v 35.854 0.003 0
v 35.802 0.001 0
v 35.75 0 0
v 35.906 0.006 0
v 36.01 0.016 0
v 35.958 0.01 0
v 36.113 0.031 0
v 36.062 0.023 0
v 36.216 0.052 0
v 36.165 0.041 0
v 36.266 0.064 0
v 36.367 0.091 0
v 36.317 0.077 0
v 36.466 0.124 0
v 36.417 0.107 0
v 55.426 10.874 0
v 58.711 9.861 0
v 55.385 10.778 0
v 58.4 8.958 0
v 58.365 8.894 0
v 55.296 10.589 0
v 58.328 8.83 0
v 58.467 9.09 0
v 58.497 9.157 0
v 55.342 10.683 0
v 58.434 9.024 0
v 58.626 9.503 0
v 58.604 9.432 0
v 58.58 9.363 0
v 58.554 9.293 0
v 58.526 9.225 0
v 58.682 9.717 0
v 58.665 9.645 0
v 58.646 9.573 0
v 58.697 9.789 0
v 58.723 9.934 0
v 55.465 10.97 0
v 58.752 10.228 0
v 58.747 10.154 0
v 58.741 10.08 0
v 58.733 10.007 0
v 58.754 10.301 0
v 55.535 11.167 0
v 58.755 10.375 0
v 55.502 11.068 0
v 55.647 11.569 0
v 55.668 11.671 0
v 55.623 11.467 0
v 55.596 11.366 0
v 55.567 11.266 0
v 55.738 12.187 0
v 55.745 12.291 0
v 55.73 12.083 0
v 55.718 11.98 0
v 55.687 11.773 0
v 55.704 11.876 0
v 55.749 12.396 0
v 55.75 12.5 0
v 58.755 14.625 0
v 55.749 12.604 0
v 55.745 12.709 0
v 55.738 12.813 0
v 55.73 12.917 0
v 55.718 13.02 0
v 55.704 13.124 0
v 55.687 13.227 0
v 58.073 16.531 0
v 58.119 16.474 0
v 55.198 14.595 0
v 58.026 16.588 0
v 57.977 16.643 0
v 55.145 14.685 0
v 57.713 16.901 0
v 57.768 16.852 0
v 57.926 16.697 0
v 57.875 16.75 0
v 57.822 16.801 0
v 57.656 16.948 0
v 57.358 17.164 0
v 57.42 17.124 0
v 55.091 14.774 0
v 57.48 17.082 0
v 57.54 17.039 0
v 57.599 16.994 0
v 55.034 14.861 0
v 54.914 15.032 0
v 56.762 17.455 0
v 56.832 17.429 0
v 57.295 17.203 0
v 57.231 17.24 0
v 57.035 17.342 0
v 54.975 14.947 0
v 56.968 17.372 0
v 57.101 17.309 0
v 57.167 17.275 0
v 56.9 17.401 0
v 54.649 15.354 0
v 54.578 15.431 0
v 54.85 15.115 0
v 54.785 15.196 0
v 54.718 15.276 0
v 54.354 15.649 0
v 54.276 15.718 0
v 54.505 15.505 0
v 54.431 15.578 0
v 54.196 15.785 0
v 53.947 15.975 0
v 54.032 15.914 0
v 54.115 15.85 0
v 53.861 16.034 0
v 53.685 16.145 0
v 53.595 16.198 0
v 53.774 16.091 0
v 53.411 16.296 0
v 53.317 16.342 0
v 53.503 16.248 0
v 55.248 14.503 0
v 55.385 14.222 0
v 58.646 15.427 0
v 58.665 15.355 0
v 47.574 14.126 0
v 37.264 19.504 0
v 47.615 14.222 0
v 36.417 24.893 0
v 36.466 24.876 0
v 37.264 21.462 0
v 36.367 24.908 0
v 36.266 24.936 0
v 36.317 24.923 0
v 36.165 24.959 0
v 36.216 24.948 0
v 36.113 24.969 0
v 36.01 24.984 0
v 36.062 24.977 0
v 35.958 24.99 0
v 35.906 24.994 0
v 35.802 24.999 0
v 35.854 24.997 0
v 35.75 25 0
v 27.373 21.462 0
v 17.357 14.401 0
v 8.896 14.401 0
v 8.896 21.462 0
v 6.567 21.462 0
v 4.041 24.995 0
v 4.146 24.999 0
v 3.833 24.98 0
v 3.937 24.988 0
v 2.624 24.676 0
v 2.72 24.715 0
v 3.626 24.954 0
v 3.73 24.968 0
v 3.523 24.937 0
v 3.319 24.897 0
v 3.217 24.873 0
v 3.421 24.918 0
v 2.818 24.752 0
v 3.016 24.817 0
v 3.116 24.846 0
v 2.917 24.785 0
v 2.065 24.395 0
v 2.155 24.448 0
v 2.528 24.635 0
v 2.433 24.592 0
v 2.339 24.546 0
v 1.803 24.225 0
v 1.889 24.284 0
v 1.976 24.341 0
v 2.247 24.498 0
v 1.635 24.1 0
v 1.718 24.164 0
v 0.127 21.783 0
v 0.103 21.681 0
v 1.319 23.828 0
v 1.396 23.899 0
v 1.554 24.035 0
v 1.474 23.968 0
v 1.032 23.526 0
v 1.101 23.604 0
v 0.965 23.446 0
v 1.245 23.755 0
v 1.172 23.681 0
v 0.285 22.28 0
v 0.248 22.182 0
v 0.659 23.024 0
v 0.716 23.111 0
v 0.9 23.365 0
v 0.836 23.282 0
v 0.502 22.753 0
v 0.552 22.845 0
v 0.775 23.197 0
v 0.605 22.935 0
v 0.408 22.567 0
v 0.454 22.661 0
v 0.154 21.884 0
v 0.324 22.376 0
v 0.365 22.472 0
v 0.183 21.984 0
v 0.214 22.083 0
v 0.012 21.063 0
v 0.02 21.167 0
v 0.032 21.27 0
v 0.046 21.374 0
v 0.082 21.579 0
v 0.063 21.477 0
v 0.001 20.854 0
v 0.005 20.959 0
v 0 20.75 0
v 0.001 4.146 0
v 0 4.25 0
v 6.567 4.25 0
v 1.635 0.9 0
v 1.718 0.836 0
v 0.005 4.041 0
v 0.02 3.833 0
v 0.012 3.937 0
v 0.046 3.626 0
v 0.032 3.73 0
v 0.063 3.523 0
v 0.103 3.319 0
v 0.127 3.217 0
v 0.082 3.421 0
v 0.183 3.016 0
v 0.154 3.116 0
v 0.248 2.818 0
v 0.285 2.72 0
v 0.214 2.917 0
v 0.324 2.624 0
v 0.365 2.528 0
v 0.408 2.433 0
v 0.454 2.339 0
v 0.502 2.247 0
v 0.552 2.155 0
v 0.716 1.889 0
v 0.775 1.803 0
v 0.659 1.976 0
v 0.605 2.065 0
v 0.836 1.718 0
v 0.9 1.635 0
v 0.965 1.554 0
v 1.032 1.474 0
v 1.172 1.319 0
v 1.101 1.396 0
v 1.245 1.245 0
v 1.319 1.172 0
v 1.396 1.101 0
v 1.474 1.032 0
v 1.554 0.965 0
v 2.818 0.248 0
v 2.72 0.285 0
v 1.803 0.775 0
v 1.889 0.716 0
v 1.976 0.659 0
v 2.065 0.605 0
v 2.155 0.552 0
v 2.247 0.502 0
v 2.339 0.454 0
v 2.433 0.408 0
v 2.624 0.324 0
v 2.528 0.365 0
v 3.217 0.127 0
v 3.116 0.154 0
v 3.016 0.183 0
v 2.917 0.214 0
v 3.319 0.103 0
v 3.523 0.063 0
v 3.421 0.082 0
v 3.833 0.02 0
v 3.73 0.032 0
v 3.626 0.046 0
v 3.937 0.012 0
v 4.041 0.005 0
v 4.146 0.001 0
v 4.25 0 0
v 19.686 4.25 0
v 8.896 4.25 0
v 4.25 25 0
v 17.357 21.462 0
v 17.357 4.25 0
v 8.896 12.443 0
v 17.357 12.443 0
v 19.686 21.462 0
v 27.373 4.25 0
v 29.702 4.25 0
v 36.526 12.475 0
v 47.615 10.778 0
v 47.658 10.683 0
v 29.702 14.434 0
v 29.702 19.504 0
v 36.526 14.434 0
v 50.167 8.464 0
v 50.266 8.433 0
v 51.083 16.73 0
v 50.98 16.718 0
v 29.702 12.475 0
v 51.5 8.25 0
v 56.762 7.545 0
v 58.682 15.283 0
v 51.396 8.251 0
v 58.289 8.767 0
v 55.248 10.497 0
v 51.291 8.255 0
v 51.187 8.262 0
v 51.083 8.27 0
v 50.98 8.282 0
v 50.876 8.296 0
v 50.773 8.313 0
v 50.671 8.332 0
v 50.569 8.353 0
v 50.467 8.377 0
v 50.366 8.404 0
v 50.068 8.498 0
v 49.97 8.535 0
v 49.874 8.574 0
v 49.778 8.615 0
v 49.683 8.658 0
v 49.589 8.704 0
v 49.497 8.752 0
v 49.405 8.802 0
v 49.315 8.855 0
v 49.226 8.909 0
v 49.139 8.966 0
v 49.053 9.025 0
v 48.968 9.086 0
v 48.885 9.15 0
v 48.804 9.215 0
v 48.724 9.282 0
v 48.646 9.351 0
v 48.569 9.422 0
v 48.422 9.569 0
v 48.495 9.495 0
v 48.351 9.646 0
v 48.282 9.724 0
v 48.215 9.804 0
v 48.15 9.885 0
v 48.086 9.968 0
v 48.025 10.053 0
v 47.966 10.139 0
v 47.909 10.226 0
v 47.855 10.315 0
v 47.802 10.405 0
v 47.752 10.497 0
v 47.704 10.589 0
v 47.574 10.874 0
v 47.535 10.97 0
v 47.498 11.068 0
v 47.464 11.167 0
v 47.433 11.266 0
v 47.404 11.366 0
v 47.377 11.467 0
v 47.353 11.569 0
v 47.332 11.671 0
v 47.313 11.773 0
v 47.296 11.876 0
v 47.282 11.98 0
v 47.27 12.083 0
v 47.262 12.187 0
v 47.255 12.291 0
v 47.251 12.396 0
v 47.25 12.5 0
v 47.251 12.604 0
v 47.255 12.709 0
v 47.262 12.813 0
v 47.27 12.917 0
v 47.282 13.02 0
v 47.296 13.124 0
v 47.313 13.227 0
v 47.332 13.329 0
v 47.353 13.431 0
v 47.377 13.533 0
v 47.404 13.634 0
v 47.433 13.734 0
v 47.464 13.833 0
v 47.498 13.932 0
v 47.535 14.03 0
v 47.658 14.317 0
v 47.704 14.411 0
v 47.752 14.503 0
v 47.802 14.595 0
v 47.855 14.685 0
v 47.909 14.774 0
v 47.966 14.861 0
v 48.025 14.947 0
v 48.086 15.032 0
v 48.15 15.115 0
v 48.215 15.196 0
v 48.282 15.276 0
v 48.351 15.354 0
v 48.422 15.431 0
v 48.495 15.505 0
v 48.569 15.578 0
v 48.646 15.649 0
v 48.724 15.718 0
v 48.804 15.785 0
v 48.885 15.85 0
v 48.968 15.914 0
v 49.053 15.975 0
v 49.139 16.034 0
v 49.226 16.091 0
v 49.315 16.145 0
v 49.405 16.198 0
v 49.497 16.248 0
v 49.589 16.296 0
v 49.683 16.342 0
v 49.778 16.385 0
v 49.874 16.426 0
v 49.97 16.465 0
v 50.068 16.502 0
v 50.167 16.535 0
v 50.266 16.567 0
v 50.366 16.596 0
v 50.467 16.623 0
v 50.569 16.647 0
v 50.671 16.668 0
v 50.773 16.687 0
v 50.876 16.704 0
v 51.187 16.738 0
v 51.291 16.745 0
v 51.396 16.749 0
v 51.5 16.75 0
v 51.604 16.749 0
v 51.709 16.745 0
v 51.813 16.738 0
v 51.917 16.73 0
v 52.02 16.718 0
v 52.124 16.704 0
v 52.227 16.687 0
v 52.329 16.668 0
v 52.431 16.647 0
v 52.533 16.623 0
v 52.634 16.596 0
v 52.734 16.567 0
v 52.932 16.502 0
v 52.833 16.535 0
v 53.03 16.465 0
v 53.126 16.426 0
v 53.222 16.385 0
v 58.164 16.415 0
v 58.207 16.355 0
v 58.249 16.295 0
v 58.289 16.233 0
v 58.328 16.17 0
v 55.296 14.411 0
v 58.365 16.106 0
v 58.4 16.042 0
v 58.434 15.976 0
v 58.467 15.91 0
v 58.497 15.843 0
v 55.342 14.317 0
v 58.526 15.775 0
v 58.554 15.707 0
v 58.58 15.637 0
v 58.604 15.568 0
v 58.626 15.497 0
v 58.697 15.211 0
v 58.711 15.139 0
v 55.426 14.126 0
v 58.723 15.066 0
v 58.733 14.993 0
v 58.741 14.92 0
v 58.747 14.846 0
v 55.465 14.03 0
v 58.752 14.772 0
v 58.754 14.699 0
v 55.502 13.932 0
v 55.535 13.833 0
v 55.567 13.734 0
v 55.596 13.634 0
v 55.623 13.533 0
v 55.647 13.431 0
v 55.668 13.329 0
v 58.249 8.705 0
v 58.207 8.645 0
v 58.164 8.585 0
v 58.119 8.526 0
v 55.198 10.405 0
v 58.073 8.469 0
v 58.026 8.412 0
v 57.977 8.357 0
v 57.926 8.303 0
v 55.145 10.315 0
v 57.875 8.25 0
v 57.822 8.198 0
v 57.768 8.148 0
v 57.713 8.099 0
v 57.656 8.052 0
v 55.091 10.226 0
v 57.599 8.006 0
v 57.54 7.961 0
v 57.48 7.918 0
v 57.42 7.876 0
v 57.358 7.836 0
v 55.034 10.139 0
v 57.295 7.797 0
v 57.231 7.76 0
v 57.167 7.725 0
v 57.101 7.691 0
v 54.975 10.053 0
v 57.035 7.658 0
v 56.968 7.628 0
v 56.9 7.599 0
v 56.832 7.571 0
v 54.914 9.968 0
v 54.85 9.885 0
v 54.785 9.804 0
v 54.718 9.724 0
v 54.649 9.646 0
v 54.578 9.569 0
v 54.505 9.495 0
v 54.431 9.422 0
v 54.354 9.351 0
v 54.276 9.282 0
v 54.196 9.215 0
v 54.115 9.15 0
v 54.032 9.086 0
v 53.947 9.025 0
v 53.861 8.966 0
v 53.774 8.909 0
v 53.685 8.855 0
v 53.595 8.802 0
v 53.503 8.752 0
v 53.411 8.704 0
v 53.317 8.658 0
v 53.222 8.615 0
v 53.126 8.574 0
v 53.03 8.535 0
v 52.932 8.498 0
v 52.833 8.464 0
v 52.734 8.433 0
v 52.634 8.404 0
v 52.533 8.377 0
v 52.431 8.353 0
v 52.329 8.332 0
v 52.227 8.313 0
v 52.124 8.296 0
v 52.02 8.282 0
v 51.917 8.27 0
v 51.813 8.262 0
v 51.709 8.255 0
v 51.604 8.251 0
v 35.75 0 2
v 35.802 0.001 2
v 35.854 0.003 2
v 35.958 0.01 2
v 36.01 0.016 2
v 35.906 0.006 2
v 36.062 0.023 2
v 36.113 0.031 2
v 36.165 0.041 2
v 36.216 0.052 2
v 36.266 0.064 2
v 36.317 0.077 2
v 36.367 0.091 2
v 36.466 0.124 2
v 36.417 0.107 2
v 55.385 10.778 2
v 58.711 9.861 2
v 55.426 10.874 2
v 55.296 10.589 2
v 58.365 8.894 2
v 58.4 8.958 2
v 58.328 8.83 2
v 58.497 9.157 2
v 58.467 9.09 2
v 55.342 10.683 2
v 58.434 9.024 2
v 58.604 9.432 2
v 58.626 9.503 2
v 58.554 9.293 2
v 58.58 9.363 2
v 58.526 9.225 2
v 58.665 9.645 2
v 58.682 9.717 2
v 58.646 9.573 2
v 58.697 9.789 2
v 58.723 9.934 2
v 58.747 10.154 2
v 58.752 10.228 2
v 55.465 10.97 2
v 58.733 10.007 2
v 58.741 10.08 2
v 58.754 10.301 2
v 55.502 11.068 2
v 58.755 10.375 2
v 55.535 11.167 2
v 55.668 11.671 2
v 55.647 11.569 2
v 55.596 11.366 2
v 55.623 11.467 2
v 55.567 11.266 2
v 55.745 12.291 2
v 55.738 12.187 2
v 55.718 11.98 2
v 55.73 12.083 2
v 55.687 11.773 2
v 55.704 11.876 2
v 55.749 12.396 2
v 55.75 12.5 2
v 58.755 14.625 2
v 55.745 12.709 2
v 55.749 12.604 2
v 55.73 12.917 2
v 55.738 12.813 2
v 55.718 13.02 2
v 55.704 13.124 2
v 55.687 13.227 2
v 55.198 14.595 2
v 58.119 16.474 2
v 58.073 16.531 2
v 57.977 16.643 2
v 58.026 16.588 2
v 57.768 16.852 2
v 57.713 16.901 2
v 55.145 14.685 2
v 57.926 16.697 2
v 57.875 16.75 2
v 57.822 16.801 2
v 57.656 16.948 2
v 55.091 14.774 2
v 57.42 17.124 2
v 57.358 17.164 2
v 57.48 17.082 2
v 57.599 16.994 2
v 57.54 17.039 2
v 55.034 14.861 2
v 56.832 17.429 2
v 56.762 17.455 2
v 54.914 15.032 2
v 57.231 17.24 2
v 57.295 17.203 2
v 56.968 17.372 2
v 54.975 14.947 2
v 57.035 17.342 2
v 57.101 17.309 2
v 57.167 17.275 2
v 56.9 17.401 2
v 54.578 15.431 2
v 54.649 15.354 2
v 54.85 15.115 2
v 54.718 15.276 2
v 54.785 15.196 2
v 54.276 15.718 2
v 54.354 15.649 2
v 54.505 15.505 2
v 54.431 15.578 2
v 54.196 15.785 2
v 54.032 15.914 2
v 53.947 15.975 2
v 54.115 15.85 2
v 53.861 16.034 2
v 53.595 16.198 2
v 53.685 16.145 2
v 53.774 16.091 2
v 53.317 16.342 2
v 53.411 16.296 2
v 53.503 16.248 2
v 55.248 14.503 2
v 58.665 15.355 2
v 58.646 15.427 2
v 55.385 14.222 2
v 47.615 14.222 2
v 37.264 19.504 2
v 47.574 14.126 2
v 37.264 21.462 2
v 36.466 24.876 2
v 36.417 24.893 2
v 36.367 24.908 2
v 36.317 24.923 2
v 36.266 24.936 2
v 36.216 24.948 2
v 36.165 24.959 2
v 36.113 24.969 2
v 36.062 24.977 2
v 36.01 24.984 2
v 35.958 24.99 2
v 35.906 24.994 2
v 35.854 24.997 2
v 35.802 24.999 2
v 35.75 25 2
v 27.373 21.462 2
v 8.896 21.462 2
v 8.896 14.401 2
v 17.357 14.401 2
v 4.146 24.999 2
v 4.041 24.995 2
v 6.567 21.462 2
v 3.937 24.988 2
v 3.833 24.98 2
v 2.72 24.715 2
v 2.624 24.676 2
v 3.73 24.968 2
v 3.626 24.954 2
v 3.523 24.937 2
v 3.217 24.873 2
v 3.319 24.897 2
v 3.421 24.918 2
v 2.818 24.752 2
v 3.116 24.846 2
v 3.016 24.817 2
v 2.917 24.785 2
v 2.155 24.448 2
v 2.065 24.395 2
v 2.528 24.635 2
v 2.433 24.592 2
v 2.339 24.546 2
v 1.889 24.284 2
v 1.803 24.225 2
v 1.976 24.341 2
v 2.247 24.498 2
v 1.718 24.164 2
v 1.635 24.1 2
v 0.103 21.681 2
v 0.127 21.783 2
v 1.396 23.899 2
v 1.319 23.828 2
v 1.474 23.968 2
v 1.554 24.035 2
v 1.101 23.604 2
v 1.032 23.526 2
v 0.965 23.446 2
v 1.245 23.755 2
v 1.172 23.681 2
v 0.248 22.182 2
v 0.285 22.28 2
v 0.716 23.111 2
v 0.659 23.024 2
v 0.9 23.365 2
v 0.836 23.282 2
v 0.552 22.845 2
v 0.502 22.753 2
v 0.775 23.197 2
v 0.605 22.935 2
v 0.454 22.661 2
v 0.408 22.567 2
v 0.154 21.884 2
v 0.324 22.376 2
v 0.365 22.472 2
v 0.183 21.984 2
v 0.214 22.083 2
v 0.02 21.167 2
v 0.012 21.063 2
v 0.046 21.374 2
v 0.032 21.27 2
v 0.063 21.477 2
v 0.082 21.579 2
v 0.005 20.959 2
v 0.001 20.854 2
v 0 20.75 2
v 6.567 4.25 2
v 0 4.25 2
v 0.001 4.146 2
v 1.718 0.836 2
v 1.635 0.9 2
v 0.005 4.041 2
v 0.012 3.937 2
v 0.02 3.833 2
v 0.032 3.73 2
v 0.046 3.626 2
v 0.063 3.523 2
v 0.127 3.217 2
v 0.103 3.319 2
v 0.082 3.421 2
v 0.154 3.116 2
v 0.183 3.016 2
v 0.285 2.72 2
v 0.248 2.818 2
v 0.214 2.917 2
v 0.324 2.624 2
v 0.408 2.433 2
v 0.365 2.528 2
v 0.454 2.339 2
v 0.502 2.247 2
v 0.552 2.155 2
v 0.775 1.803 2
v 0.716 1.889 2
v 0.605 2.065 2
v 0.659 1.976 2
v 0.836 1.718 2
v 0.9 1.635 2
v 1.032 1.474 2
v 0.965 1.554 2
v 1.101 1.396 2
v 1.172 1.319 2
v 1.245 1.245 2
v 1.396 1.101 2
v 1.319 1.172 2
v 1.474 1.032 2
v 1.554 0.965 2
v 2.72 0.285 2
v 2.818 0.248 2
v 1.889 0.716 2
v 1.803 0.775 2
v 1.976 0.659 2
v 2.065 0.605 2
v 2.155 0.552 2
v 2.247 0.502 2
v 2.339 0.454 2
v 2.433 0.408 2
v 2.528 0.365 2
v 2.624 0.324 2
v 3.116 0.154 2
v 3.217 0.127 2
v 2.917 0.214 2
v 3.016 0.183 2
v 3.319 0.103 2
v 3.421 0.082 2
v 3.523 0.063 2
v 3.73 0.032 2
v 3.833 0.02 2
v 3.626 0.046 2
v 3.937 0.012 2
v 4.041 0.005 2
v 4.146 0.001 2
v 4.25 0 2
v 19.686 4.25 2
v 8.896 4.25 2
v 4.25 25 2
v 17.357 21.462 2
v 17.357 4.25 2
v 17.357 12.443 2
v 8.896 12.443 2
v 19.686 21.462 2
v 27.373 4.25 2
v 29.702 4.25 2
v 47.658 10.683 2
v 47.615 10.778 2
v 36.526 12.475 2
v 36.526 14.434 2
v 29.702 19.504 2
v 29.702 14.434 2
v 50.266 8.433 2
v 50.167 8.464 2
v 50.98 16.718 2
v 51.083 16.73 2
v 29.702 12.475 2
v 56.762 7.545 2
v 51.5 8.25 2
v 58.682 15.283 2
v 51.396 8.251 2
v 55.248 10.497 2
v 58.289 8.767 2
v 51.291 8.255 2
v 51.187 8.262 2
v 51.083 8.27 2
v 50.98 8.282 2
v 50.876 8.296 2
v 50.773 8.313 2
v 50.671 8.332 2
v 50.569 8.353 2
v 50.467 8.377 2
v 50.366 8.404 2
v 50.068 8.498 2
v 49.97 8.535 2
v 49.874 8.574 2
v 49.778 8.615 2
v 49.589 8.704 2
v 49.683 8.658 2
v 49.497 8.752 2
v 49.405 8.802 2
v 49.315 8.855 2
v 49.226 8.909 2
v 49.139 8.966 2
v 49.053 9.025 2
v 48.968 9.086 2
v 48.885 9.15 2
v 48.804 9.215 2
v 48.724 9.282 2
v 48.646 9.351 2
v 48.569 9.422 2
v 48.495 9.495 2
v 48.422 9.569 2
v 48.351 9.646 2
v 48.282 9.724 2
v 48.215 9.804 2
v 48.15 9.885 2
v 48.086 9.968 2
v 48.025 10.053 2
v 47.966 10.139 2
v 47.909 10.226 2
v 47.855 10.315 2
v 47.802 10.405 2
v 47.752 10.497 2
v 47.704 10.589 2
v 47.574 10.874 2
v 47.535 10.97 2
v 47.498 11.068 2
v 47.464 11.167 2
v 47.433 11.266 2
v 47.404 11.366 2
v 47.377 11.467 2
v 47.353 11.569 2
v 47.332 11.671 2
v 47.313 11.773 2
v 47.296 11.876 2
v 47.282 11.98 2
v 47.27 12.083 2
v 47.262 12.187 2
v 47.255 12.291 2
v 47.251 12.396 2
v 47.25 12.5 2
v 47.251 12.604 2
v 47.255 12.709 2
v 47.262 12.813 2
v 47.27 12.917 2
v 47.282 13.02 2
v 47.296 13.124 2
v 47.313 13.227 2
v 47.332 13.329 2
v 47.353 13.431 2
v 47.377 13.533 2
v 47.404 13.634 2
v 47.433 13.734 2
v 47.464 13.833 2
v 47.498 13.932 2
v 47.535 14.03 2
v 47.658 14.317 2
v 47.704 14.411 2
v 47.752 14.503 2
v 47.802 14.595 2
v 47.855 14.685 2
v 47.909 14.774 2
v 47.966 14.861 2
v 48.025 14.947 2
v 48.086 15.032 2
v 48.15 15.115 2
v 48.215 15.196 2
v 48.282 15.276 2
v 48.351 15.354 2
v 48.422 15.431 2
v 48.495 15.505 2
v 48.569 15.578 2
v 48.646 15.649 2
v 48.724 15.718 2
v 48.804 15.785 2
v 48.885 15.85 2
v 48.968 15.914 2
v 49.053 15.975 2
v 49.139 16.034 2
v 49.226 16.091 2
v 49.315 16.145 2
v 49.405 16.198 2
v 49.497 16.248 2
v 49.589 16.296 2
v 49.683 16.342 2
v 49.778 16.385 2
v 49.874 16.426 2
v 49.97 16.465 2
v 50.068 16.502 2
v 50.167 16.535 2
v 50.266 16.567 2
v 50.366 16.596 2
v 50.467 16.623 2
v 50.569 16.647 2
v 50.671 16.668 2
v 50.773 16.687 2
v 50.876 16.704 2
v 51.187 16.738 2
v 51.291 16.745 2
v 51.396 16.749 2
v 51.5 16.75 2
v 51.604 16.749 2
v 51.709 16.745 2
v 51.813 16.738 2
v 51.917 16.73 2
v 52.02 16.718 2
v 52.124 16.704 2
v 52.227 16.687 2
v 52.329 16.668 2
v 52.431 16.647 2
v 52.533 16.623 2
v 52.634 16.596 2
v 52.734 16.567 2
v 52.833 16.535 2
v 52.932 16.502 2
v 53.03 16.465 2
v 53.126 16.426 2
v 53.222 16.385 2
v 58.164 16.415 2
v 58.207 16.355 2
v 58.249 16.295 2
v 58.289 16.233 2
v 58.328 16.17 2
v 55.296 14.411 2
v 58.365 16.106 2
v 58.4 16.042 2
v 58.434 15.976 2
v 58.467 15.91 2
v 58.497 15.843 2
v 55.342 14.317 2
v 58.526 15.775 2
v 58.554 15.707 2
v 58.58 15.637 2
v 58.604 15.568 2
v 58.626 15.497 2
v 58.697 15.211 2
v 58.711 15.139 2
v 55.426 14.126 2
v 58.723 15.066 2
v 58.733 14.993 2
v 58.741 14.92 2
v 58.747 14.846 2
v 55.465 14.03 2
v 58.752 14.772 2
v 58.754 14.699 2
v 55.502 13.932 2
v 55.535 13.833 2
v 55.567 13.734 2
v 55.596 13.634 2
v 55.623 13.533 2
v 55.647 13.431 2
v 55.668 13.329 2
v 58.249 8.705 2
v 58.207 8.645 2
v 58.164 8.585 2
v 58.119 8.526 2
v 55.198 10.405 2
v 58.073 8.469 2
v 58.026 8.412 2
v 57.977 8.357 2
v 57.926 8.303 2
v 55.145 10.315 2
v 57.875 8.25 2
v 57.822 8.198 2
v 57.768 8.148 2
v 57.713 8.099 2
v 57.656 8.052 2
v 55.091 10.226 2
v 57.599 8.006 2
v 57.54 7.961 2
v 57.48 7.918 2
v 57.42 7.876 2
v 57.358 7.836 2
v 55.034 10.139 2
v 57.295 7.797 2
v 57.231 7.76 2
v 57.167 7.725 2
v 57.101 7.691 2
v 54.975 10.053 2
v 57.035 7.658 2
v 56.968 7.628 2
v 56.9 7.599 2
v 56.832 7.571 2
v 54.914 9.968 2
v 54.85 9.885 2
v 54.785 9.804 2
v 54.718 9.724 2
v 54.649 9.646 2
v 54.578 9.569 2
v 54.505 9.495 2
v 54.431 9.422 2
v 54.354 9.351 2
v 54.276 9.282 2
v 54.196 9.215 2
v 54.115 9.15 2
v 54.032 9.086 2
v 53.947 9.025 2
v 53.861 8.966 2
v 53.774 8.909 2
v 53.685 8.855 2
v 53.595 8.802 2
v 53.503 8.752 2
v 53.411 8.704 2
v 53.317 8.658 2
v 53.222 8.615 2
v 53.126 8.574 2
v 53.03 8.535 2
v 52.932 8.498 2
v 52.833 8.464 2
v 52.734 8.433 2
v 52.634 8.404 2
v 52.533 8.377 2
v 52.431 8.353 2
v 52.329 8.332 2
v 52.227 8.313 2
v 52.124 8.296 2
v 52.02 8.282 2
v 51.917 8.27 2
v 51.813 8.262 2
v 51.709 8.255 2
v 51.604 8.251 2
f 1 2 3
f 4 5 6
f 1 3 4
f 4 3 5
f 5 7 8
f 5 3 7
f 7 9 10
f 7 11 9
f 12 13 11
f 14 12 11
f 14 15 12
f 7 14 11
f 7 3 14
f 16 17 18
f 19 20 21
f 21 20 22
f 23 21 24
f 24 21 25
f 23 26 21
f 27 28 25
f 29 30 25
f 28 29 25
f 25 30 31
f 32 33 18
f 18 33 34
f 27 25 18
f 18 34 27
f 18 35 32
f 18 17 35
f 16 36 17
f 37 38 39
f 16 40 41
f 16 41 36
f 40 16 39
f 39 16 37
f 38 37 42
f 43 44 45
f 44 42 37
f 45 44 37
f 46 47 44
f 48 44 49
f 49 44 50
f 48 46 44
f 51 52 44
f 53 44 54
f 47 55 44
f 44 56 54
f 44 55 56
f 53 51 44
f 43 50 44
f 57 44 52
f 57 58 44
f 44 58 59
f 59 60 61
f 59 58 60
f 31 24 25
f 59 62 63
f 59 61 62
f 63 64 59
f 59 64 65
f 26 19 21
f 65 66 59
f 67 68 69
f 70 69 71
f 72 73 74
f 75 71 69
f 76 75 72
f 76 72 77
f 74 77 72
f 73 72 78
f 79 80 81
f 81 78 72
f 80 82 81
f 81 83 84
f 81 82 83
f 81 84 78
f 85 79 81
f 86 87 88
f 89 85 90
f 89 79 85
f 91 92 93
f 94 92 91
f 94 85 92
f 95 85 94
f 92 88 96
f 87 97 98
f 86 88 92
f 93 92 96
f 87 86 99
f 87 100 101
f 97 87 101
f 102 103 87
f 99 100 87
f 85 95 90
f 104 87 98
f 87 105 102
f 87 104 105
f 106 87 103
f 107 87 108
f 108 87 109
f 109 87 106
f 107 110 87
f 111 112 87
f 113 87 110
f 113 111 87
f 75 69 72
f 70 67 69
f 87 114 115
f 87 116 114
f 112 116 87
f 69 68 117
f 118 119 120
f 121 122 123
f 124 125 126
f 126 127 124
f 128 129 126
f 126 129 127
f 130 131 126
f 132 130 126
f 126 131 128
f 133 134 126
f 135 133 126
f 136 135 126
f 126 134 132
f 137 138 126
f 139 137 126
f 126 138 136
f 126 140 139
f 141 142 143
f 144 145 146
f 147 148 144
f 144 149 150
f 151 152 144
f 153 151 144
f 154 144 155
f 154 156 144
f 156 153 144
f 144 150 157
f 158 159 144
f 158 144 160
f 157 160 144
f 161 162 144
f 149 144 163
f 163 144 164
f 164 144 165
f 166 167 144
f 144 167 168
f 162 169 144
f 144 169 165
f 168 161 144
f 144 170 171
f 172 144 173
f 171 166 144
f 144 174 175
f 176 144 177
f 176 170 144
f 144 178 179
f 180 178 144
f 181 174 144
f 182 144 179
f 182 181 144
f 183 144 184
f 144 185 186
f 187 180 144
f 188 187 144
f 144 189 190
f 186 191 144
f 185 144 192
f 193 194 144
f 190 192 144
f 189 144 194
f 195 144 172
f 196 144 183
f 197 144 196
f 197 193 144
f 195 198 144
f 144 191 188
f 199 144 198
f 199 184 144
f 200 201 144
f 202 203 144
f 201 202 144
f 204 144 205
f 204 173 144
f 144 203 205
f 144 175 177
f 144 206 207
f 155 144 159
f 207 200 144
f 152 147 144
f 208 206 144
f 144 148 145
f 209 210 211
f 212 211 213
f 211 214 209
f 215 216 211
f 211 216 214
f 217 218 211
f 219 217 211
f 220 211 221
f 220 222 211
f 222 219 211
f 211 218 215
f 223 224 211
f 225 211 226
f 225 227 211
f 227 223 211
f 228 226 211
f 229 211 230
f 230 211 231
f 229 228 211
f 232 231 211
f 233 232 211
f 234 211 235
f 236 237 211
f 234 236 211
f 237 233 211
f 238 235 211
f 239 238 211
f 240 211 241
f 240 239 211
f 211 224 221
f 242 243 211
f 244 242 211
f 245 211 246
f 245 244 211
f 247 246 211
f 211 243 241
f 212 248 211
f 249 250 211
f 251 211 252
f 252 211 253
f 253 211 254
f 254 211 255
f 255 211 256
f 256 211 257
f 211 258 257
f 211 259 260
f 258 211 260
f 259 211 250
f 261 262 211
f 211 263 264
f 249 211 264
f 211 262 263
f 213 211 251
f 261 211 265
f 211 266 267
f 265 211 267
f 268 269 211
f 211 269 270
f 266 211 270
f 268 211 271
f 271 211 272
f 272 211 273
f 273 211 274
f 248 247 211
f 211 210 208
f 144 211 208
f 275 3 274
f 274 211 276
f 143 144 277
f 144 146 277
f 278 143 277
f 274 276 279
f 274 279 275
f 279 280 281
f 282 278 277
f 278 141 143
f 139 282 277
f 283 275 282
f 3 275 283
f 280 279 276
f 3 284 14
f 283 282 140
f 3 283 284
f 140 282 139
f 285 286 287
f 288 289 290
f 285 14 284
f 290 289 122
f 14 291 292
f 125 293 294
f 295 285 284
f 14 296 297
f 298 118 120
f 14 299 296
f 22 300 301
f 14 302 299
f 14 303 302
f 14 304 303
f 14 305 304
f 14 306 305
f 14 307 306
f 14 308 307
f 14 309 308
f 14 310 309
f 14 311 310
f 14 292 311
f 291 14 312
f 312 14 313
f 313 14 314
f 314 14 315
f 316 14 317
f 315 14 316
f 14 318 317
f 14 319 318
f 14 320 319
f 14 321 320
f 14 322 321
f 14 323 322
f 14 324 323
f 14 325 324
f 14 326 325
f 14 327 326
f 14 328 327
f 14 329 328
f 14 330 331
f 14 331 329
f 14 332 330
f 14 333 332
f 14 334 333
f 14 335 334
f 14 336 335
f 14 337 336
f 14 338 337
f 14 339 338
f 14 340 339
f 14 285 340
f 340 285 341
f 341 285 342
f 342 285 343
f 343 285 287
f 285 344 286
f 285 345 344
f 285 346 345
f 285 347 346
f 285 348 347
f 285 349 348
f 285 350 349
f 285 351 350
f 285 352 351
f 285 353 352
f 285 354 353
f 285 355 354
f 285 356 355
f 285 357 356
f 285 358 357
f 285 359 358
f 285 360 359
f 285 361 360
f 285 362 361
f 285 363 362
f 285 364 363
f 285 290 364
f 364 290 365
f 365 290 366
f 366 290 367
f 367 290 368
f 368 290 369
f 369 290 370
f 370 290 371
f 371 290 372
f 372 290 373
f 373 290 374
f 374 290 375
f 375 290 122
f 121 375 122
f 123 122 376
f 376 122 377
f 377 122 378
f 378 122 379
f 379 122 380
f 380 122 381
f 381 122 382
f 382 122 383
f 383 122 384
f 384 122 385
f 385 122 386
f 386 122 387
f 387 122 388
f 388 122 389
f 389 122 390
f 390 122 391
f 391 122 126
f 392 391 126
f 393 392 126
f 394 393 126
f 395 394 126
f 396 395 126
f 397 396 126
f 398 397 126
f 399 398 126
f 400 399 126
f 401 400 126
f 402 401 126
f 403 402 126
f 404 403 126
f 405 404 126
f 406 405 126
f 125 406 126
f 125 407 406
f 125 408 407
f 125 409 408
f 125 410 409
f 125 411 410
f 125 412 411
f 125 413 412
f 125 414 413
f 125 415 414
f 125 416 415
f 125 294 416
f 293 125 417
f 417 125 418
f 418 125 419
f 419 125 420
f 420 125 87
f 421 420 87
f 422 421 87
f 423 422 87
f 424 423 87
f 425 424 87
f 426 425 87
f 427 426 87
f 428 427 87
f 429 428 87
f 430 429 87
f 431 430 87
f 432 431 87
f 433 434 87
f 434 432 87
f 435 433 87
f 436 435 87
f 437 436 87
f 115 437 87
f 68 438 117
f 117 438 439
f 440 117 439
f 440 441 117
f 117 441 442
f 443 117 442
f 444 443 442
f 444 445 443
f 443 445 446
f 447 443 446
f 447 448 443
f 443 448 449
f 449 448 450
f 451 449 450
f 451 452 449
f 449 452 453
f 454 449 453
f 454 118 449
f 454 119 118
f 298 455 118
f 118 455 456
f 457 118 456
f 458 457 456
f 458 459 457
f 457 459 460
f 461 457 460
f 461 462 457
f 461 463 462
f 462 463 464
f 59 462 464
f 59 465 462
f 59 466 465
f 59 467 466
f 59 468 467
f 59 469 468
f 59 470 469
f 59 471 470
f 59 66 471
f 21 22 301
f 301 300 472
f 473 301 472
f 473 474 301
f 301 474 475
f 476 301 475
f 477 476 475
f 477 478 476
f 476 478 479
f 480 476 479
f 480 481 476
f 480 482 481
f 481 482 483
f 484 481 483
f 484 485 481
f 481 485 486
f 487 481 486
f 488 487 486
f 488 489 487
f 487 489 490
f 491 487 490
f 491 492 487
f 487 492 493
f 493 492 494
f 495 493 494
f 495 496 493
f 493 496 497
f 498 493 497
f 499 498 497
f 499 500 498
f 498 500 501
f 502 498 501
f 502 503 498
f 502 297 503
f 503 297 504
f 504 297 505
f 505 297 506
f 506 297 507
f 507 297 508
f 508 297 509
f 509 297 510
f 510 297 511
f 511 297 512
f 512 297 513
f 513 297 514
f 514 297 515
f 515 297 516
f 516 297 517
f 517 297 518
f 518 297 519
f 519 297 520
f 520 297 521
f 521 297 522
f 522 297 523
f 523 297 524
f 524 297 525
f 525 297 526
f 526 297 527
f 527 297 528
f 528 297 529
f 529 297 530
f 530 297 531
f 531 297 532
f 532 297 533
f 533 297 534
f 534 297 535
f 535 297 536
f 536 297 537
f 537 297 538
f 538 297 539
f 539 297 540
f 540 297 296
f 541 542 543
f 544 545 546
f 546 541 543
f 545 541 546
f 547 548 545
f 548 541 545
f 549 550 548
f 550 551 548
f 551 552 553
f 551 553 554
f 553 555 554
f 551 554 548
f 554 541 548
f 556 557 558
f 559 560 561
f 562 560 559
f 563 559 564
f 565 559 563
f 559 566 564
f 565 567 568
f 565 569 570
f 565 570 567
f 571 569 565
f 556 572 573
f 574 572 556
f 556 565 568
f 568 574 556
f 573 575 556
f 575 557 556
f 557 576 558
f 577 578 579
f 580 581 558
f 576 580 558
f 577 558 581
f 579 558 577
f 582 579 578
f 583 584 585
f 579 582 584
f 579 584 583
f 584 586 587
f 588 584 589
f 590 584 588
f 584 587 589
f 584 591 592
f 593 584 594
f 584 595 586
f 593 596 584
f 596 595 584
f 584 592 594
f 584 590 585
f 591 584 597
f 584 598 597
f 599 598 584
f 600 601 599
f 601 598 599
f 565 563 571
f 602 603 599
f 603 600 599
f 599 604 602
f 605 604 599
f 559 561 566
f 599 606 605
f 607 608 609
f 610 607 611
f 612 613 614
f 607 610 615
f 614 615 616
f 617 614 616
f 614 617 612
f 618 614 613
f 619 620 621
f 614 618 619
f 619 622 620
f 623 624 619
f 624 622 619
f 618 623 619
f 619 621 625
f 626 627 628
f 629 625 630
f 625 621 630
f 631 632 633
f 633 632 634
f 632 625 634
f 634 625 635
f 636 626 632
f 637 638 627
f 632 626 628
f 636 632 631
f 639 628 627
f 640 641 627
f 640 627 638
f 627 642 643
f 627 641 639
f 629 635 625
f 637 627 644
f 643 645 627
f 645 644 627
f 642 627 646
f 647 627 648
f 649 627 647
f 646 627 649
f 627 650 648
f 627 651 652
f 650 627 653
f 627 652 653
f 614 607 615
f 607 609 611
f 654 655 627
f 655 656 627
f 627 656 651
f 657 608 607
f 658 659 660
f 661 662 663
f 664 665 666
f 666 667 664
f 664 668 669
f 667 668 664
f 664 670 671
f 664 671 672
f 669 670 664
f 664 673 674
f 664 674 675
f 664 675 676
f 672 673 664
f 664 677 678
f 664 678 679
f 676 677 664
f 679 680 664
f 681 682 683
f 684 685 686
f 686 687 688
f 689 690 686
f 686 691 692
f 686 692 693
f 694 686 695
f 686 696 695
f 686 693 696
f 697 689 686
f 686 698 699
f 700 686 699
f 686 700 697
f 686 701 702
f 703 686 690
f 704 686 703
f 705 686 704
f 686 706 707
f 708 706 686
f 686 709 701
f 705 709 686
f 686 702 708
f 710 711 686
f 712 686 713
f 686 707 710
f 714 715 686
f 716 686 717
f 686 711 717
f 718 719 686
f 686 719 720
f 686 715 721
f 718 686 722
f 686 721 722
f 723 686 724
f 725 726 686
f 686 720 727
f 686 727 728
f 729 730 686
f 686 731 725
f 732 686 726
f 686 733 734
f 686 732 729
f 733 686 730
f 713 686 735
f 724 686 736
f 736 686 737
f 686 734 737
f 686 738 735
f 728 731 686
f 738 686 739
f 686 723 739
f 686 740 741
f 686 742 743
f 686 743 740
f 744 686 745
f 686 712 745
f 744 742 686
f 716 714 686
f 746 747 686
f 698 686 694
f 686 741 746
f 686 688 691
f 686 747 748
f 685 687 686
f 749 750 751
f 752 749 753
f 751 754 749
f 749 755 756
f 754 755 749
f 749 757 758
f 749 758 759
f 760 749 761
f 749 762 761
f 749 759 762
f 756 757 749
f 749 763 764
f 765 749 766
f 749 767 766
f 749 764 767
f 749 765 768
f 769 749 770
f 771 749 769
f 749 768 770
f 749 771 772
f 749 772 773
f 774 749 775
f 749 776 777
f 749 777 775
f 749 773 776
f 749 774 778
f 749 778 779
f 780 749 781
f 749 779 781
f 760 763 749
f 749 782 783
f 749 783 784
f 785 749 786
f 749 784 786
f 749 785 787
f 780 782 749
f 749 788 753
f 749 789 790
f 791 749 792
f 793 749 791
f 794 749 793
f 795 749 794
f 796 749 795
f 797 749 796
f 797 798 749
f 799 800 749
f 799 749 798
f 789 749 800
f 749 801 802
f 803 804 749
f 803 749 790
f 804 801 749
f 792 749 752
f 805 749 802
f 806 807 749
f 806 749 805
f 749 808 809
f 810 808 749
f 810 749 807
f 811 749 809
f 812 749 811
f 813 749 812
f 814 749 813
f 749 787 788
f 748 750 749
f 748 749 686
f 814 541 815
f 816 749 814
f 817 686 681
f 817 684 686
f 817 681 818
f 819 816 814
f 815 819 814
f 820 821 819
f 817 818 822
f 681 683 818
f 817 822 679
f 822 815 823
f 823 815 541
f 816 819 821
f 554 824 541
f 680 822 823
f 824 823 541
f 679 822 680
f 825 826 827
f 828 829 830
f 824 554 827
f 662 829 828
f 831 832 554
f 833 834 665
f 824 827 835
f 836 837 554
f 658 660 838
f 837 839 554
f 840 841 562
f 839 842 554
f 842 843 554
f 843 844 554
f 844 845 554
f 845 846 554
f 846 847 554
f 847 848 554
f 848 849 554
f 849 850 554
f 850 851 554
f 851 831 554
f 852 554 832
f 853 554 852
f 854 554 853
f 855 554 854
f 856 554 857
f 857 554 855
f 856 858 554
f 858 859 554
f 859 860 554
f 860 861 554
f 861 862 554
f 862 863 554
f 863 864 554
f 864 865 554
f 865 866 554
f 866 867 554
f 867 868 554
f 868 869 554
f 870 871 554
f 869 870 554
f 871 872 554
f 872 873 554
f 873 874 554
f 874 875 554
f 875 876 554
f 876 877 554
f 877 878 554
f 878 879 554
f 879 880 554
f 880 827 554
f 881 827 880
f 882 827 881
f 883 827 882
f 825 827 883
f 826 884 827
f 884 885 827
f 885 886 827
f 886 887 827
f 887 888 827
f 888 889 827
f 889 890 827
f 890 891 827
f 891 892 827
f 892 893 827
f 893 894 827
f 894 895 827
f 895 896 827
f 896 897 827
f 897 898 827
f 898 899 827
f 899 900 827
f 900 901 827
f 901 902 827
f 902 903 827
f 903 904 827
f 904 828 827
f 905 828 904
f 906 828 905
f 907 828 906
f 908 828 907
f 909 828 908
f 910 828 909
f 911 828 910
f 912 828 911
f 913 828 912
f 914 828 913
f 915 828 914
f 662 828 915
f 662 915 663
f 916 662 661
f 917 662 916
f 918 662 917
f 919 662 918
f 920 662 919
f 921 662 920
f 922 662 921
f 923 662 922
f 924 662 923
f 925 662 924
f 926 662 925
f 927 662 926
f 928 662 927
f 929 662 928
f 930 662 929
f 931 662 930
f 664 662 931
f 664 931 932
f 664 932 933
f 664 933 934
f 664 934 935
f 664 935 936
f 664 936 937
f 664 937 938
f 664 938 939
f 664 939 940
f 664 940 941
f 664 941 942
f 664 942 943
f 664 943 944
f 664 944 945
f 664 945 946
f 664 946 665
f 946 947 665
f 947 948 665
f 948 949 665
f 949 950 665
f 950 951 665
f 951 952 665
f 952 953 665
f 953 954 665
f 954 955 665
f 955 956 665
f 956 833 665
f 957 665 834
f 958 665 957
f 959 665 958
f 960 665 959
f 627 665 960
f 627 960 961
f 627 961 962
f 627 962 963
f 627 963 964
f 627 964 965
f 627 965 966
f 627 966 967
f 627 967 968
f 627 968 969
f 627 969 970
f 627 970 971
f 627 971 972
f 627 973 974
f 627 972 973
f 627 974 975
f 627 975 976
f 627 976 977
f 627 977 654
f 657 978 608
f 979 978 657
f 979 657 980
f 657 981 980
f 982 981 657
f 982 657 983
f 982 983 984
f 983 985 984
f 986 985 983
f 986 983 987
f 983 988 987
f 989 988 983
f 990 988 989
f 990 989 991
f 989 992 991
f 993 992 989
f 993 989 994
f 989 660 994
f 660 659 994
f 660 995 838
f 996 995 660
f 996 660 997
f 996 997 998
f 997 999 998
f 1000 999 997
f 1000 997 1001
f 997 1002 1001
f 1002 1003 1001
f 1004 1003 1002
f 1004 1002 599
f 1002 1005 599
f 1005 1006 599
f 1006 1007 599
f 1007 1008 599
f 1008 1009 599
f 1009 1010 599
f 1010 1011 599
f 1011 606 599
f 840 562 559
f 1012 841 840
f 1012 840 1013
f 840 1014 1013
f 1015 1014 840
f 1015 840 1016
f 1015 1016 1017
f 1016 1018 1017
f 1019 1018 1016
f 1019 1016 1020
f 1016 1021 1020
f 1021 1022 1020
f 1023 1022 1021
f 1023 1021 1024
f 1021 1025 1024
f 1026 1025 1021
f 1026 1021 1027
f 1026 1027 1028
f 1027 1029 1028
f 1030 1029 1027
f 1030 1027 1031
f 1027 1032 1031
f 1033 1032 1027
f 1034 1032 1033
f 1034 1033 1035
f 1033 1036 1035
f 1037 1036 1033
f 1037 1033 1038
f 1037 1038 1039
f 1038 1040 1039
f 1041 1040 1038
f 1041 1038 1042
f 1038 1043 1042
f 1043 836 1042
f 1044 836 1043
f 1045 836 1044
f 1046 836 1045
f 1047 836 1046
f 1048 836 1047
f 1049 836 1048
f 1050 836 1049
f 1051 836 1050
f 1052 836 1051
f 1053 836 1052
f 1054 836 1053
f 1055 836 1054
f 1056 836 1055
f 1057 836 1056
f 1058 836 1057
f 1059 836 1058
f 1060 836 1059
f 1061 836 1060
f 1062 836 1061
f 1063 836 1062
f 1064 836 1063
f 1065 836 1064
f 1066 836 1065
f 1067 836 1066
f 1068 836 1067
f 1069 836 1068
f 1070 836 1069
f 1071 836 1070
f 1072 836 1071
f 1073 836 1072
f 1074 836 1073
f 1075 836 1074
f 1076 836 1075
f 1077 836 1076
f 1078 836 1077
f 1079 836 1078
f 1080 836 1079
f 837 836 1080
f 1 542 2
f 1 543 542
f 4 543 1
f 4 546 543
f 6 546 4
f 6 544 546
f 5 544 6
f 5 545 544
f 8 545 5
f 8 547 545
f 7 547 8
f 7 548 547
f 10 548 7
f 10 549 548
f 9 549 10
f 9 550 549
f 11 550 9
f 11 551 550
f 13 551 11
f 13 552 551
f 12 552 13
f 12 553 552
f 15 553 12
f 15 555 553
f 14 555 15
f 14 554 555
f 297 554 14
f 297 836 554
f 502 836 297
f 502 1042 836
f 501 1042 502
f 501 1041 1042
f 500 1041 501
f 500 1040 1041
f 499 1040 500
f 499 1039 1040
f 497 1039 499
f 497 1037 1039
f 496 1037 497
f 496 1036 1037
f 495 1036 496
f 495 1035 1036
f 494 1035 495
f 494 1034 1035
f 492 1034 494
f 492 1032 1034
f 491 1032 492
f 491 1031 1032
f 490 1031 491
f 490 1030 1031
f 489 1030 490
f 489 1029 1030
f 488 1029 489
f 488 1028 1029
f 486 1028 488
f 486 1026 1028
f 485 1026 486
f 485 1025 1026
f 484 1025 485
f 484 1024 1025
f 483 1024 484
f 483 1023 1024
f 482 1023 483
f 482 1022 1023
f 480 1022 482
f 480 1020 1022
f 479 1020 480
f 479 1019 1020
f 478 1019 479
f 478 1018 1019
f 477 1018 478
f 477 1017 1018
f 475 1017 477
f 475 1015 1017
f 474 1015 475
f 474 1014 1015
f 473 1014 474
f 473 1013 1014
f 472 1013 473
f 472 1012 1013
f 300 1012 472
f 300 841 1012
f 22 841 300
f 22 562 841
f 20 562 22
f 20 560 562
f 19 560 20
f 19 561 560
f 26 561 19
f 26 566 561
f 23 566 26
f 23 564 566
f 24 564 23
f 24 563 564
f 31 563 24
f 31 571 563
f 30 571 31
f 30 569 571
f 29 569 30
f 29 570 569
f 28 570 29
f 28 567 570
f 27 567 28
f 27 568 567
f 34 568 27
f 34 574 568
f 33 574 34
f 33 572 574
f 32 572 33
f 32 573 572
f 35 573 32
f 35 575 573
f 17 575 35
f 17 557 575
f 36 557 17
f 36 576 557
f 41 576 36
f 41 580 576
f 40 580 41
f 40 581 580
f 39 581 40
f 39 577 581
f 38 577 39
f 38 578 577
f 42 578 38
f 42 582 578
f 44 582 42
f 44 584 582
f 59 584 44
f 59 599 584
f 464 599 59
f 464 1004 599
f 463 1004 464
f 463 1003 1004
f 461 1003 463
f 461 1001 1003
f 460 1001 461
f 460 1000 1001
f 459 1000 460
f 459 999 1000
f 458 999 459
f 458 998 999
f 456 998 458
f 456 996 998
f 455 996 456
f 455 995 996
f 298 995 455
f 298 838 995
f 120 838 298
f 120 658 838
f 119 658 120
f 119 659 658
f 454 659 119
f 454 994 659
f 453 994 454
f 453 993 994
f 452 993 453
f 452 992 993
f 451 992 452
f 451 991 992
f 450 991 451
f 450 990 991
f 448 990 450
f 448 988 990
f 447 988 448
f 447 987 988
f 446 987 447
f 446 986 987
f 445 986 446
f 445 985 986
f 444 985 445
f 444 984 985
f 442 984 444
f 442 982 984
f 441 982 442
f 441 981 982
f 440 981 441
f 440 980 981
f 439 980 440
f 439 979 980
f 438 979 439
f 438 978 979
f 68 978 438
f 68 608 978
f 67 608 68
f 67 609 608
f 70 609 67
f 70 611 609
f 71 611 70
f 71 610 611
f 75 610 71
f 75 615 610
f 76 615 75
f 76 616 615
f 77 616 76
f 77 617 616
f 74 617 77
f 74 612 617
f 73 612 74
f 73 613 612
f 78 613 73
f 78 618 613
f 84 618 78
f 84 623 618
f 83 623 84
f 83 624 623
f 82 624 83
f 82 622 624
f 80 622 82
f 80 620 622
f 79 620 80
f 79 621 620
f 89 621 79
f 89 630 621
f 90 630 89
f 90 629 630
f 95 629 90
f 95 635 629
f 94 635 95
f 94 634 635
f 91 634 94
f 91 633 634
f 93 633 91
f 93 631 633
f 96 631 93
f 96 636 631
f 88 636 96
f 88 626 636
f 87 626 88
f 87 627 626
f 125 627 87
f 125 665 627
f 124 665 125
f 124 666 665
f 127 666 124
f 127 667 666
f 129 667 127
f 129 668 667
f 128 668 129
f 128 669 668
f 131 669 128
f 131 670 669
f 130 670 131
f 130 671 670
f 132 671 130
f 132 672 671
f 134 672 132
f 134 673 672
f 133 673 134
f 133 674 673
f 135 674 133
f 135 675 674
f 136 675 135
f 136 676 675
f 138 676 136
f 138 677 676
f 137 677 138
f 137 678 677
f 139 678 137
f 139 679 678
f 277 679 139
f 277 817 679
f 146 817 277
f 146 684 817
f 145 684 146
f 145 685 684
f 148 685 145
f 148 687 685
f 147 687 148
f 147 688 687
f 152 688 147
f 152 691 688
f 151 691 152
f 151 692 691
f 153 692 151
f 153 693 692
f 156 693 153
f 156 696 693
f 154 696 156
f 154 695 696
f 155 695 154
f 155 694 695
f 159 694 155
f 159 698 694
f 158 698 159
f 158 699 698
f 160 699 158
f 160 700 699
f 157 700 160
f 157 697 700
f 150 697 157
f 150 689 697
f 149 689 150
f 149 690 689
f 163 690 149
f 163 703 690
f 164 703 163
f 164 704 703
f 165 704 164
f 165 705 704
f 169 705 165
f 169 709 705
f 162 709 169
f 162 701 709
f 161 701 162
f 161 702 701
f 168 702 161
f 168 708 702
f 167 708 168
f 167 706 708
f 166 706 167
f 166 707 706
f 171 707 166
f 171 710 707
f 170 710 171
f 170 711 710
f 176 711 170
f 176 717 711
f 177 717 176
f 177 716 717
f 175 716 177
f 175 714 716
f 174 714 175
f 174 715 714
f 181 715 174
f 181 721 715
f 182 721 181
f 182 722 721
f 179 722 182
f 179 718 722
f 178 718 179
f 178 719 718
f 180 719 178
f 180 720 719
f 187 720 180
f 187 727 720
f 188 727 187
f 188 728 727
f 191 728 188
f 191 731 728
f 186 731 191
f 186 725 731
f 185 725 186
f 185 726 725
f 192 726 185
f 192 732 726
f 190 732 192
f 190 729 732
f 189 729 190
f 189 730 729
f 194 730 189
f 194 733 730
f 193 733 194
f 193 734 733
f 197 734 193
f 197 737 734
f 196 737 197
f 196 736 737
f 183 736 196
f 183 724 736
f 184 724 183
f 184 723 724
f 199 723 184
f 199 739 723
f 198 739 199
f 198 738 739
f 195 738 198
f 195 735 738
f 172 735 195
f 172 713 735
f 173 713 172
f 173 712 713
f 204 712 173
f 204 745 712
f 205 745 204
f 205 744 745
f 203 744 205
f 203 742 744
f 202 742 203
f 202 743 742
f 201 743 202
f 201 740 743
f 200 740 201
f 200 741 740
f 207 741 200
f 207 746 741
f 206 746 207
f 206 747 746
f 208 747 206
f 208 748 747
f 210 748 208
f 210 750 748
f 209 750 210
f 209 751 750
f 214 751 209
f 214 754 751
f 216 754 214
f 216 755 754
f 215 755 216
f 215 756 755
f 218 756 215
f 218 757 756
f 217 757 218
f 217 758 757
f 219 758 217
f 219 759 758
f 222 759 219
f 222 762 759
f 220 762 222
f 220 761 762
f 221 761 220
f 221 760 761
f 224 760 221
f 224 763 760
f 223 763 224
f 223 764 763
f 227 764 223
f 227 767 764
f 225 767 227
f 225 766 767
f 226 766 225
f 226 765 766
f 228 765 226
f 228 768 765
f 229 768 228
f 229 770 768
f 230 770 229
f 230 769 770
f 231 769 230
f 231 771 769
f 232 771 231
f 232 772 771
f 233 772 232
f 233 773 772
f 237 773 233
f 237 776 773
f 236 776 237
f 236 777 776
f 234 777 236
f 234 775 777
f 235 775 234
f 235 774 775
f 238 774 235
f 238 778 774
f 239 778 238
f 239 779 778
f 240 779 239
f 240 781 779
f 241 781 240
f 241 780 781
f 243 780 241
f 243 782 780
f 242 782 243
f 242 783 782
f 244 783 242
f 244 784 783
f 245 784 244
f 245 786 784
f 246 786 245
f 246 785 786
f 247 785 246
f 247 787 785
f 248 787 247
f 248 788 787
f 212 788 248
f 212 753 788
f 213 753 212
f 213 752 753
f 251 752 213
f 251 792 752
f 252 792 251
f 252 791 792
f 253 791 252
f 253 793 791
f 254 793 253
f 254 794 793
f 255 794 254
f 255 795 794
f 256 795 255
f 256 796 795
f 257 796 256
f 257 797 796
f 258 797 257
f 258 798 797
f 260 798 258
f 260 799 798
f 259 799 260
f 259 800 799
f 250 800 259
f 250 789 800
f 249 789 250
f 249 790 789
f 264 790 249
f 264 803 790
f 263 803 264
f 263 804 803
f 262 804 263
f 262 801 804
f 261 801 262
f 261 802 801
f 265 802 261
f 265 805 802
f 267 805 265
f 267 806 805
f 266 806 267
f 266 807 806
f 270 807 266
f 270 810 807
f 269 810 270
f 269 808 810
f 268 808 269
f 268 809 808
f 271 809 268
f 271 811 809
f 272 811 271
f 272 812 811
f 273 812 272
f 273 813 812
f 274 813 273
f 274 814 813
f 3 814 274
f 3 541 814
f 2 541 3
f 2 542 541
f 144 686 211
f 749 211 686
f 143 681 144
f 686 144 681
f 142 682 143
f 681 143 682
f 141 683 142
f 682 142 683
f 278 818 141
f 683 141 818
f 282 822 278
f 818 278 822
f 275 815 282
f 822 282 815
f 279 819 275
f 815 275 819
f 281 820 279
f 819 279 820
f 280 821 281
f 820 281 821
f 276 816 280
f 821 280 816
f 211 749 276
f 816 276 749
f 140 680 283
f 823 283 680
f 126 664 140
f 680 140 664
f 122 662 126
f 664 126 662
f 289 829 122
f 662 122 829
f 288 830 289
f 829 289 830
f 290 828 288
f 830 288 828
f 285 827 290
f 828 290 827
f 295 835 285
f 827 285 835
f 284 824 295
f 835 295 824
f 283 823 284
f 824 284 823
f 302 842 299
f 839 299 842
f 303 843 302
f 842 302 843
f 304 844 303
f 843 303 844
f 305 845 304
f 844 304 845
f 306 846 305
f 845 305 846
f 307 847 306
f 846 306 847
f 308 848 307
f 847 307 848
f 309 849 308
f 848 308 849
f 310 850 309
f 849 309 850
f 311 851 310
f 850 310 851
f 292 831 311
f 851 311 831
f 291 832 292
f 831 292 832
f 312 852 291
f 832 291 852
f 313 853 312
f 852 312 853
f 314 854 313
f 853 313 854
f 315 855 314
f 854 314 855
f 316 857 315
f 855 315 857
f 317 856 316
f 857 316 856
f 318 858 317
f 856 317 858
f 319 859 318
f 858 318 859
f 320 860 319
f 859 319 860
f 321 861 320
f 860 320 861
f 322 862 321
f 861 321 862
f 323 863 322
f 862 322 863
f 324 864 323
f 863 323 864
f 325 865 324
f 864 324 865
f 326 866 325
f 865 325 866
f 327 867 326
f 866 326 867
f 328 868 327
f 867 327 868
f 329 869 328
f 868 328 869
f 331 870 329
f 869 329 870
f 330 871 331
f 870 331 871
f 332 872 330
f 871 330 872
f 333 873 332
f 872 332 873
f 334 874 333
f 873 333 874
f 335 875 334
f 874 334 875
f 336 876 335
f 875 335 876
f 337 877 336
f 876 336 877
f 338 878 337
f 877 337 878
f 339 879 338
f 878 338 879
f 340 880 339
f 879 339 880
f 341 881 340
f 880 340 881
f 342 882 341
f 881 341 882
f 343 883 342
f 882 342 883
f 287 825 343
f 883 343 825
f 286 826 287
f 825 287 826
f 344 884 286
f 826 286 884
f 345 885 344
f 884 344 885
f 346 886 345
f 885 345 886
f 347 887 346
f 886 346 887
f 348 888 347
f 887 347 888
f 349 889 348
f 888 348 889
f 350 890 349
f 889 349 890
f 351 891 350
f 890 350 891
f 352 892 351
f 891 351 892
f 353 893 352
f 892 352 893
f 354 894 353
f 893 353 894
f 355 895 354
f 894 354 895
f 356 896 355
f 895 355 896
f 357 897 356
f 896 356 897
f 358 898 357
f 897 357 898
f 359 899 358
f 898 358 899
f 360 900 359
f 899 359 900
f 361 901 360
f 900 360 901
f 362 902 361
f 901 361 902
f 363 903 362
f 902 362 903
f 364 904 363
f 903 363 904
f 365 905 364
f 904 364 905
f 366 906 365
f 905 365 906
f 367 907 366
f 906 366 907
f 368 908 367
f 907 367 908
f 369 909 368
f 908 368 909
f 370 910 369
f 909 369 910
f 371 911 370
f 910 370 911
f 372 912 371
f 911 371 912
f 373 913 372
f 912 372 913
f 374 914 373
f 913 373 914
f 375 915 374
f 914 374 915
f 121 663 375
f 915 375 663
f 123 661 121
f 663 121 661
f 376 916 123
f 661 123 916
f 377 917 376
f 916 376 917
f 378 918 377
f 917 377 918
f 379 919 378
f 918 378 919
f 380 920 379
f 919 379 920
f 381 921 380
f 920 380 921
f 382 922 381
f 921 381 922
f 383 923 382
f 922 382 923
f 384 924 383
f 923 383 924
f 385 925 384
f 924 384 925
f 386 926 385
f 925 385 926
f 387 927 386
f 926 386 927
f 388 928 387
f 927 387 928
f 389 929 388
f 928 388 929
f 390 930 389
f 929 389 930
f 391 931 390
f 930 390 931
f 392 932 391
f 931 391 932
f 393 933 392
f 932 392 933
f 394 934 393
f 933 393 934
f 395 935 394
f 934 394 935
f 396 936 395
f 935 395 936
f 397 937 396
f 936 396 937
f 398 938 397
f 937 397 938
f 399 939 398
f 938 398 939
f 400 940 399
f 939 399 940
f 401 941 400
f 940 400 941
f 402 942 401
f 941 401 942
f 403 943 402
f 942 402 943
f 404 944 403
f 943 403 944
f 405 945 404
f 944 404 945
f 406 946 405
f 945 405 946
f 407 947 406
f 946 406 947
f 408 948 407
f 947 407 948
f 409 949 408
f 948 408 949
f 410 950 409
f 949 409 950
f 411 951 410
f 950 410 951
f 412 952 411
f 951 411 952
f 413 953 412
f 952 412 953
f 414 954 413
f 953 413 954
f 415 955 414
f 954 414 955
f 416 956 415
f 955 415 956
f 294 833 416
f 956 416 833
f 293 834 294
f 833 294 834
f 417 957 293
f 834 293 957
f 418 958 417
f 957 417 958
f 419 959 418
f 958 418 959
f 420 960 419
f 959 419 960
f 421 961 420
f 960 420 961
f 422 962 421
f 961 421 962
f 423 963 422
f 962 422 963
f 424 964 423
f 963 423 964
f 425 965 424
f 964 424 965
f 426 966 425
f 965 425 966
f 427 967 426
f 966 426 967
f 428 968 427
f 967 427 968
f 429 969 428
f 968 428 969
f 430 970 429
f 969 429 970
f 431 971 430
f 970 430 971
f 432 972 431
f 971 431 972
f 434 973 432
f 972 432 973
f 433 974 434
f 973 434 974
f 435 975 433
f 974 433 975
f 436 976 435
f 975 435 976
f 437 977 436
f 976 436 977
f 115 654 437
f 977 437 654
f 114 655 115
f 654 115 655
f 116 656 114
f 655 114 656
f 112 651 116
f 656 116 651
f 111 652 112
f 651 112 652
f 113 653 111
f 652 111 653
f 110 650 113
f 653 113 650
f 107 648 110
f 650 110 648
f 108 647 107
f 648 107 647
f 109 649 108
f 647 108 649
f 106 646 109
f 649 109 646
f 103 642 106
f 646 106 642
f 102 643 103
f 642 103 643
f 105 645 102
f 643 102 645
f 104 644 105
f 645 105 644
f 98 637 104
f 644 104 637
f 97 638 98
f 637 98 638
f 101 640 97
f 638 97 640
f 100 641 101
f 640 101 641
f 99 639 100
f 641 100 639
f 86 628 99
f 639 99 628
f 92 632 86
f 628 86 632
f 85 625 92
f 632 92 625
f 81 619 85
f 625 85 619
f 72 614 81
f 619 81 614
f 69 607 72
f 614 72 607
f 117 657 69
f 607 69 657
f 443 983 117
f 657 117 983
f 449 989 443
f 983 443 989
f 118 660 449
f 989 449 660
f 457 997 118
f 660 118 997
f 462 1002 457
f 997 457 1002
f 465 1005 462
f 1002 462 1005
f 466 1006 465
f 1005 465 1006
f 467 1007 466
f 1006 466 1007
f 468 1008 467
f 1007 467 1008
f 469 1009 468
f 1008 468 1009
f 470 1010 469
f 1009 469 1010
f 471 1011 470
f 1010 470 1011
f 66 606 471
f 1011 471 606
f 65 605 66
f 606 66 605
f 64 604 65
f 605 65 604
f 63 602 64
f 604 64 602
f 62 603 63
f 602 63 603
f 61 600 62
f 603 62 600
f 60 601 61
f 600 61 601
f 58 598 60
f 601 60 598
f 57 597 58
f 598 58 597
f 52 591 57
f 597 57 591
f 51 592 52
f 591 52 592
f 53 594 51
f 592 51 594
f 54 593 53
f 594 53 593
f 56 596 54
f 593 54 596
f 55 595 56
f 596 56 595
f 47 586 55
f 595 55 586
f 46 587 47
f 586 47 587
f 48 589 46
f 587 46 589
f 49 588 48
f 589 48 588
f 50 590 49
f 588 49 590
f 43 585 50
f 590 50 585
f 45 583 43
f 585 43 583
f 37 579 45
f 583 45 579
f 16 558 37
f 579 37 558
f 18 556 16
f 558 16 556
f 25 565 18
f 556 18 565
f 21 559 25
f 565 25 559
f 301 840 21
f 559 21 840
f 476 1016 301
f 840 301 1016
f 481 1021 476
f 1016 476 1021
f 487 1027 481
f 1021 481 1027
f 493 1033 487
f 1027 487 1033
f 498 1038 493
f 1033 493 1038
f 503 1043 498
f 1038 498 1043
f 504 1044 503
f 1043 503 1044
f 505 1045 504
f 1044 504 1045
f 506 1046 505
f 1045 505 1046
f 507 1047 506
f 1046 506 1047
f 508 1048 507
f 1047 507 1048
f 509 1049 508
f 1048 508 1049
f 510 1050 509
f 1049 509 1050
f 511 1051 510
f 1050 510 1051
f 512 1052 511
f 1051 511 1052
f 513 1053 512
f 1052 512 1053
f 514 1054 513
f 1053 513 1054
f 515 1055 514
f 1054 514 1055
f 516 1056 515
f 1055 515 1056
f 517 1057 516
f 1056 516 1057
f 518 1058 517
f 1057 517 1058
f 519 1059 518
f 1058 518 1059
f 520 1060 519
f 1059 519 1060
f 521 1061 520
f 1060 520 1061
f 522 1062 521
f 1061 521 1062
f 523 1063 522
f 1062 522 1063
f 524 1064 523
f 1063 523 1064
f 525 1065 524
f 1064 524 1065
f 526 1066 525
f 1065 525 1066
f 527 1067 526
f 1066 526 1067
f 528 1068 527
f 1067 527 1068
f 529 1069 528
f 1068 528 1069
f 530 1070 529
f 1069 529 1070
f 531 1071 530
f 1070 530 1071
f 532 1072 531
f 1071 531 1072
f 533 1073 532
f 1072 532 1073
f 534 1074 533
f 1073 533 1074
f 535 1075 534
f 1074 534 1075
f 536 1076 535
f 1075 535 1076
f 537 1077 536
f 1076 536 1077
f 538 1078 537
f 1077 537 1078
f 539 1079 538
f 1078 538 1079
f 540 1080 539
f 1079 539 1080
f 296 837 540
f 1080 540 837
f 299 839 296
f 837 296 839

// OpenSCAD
// Hjullapper 
$fn = $preview ? 8 : 256;

tykkelse=2;
ventil_r=4.25;
bredde=25;
knekk_lengde=40;
full_lengde=knekk_lengde+20;
fontface="Octin Prison:style=Regular";

module tag(tagtext, height) {
    linear_extrude(height) {
        difference() {
            hull() { 
                translate([ventil_r,ventil_r]) circle(r=ventil_r);
                translate([ventil_r,bredde-ventil_r]) circle(r=ventil_r);
                translate([knekk_lengde-ventil_r,ventil_r/2]) circle(r=ventil_r/2);
                translate([knekk_lengde-ventil_r,bredde-ventil_r/2]) circle(r=ventil_r/2);
                translate([full_lengde-ventil_r,bredde/2+ventil_r/2]) circle(r=ventil_r/sqrt(2));
                translate([full_lengde-ventil_r,bredde/2-ventil_r/2]) circle(r=ventil_r/sqrt(2));
            }
            translate([full_lengde-ventil_r*2,bredde/2]) circle(r=ventil_r);
            translate([ventil_r,ventil_r]) text(tagtext,size=17,font=fontface, spacing=1.2);
        }
    }
}

tag("HF", height=tykkelse);
/*tag("HB", height=tykkelse);
tag("VF", height=tykkelse);
tag("VB", height=tykkelse);
*/
